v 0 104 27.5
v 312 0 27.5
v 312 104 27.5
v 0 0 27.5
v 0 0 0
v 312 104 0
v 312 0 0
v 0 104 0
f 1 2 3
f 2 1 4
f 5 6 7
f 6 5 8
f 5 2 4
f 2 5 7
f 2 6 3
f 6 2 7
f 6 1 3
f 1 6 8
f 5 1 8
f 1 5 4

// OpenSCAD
BoxTopLength=197;
BoxTopWidth=197;
BoxHeight=190;
LipHeight=4;
LipThickness=2;
LipOverHangWidth=25;
BoxTopThickness=2;
BoxThickness=2;
IsOpenTop=true;

/*
    NOTE: Med drawer is 404 mm wide.
*/
DrawerWidth = 403;
/*
Project Box
These are sold at Costco.
*/
ProjectBoxWidth=312;
ProjectBoxHeight = 55;
StackCount = 2;

/*
Project Types
*/

TreadSpoilDia = 19.2;
TreadSpoilHeight = 58;

ShortTreadSpoilDia = 35;
ShortTreadShoilHeight = 46; 

LgMedTray = false;
Md1MedTray = false;
Md2MedTray = false;
SmMedTray = false;
//PB = ProjectBox;
PB_SpoilHorizontalShallow = false;
PB_ShortSpoilHorizontalShallow = true;

//When true completes for the width of the drawer.
Complement = true;
Shell = true;

//options are; SingleBox, DoubleBox, TripleBox, SingleProjectBox, DoubleProjectBox
drawTray("DoubleProjectBox");

function actualLip(value) = value * 2;
function stackBoxHeight(height, count, lip) = height/count + (count-1) * lip;
function half(width) = width/2;
function third(width) = width/3;
function quarter(width) = width/4;
function sixth(width) = width/6;

/*
Using just the cube to draw a box allows control of the
top and wall thickness to be defined in the slicer.
using 0% infill, # of walls and # of top layers will make it an tray.
*/
module Box(x,y,wall, height)
{
    b_floor = wall;
    //resize([0,0,0]) 
    //translate([x/2,y/2,0]) 
    union()
    {
        cube([x,y,b_floor],true); //box floor
        BoxWalls(x,y,wall,height);
    }

}

module ShellBox(width,depth,height)
{
    translate([width/2,depth/2,height/2])
    cube([width,depth,height],true);
}

module BoxWalls(width,depth,height,wall)
{
     translate([width/2,depth/2,height/2]) difference()
    {
    cube([width,depth,height],true);
    cube([width-wall,depth-wall,height+1], true);
    }
}

module drawTray(trayType)
{
    if(trayType=="SingleBox")
        {
            ShellBox(sixth(ProjectBoxWidth)
                ,sixth(ProjectBoxWidth)
                ,stackBoxHeight(ProjectBoxHeight,StackCount,0));
        }
        
        if(trayType=="DoubleBox")
        {
            ShellBox(third(ProjectBoxWidth)
                ,sixth(ProjectBoxWidth)
                ,stackBoxHeight(ProjectBoxHeight,StackCount,0));
        }
        
        if(trayType=="TripleBox")
        {
            ShellBox(half(ProjectBoxWidth)
                ,sixth(ProjectBoxWidth)
                ,stackBoxHeight(ProjectBoxHeight,StackCount,0));
        }

        if(trayType=="SingleProjectBox")
        {
            ShellBox(ProjectBoxWidth
                ,sixth(ProjectBoxWidth)
                ,stackBoxHeight(ProjectBoxHeight,StackCount,0));
        }
        
        if(trayType=="DoubleProjectBox")
        {
            ShellBox(ProjectBoxWidth
                ,third(ProjectBoxWidth)
                ,stackBoxHeight(ProjectBoxHeight,StackCount,0));
        }
        
    if(trayType=="LgMedTray"){if (!Complement) Box(76,225,2,35); else Box(76,DrawerWidth-225,2,35);}
    if(trayType=="Md1MedTray"){if (!Complement) Box(65,200,2,35); else Box(65,DrawerWidth-200,2,35);}
    if(trayType=="Md2MedTray"){if (!Complement) Box(47,196,2,35); else Box(47,DrawerWidth-196,2,35);}
    if(trayType=="SmMedTray"){if (!Complement) Box(35,225,2,35); else Box(35,DrawerWidth-225,2,35);}
    if(trayType=="PB_SpoilHorizontalShallow")
        if (Shell)
            ShellBox(ProjectBoxWidth/3,(TreadSpoilHeight+(TreadSpoilDia/6)),(TreadSpoilDia*.8));
            else
            Box(ProjectBoxWidth/3,(TreadSpoilHeight+(TreadSpoilDia/6)),1.2,(TreadSpoilDia*.8));
            
    if(trayType=="PB_ShortSpoilHorizontalShallow")
        if (Shell)
            ShellBox(ProjectBoxWidth/3,(ShortTreadShoilHeight+(ShortTreadSpoilDia/6)),(ShortTreadSpoilDia*.8));
            else
            Box(ProjectBoxWidth/3,(ShortTreadShoilHeight+(ShortTreadSpoilDia/6)),1.2,(ShortTreadSpoilDia*.8));
        
}



//translate([0,(TreadShoilHeight+(TreadSpoilDia/6))+4,0]) drawTray();
